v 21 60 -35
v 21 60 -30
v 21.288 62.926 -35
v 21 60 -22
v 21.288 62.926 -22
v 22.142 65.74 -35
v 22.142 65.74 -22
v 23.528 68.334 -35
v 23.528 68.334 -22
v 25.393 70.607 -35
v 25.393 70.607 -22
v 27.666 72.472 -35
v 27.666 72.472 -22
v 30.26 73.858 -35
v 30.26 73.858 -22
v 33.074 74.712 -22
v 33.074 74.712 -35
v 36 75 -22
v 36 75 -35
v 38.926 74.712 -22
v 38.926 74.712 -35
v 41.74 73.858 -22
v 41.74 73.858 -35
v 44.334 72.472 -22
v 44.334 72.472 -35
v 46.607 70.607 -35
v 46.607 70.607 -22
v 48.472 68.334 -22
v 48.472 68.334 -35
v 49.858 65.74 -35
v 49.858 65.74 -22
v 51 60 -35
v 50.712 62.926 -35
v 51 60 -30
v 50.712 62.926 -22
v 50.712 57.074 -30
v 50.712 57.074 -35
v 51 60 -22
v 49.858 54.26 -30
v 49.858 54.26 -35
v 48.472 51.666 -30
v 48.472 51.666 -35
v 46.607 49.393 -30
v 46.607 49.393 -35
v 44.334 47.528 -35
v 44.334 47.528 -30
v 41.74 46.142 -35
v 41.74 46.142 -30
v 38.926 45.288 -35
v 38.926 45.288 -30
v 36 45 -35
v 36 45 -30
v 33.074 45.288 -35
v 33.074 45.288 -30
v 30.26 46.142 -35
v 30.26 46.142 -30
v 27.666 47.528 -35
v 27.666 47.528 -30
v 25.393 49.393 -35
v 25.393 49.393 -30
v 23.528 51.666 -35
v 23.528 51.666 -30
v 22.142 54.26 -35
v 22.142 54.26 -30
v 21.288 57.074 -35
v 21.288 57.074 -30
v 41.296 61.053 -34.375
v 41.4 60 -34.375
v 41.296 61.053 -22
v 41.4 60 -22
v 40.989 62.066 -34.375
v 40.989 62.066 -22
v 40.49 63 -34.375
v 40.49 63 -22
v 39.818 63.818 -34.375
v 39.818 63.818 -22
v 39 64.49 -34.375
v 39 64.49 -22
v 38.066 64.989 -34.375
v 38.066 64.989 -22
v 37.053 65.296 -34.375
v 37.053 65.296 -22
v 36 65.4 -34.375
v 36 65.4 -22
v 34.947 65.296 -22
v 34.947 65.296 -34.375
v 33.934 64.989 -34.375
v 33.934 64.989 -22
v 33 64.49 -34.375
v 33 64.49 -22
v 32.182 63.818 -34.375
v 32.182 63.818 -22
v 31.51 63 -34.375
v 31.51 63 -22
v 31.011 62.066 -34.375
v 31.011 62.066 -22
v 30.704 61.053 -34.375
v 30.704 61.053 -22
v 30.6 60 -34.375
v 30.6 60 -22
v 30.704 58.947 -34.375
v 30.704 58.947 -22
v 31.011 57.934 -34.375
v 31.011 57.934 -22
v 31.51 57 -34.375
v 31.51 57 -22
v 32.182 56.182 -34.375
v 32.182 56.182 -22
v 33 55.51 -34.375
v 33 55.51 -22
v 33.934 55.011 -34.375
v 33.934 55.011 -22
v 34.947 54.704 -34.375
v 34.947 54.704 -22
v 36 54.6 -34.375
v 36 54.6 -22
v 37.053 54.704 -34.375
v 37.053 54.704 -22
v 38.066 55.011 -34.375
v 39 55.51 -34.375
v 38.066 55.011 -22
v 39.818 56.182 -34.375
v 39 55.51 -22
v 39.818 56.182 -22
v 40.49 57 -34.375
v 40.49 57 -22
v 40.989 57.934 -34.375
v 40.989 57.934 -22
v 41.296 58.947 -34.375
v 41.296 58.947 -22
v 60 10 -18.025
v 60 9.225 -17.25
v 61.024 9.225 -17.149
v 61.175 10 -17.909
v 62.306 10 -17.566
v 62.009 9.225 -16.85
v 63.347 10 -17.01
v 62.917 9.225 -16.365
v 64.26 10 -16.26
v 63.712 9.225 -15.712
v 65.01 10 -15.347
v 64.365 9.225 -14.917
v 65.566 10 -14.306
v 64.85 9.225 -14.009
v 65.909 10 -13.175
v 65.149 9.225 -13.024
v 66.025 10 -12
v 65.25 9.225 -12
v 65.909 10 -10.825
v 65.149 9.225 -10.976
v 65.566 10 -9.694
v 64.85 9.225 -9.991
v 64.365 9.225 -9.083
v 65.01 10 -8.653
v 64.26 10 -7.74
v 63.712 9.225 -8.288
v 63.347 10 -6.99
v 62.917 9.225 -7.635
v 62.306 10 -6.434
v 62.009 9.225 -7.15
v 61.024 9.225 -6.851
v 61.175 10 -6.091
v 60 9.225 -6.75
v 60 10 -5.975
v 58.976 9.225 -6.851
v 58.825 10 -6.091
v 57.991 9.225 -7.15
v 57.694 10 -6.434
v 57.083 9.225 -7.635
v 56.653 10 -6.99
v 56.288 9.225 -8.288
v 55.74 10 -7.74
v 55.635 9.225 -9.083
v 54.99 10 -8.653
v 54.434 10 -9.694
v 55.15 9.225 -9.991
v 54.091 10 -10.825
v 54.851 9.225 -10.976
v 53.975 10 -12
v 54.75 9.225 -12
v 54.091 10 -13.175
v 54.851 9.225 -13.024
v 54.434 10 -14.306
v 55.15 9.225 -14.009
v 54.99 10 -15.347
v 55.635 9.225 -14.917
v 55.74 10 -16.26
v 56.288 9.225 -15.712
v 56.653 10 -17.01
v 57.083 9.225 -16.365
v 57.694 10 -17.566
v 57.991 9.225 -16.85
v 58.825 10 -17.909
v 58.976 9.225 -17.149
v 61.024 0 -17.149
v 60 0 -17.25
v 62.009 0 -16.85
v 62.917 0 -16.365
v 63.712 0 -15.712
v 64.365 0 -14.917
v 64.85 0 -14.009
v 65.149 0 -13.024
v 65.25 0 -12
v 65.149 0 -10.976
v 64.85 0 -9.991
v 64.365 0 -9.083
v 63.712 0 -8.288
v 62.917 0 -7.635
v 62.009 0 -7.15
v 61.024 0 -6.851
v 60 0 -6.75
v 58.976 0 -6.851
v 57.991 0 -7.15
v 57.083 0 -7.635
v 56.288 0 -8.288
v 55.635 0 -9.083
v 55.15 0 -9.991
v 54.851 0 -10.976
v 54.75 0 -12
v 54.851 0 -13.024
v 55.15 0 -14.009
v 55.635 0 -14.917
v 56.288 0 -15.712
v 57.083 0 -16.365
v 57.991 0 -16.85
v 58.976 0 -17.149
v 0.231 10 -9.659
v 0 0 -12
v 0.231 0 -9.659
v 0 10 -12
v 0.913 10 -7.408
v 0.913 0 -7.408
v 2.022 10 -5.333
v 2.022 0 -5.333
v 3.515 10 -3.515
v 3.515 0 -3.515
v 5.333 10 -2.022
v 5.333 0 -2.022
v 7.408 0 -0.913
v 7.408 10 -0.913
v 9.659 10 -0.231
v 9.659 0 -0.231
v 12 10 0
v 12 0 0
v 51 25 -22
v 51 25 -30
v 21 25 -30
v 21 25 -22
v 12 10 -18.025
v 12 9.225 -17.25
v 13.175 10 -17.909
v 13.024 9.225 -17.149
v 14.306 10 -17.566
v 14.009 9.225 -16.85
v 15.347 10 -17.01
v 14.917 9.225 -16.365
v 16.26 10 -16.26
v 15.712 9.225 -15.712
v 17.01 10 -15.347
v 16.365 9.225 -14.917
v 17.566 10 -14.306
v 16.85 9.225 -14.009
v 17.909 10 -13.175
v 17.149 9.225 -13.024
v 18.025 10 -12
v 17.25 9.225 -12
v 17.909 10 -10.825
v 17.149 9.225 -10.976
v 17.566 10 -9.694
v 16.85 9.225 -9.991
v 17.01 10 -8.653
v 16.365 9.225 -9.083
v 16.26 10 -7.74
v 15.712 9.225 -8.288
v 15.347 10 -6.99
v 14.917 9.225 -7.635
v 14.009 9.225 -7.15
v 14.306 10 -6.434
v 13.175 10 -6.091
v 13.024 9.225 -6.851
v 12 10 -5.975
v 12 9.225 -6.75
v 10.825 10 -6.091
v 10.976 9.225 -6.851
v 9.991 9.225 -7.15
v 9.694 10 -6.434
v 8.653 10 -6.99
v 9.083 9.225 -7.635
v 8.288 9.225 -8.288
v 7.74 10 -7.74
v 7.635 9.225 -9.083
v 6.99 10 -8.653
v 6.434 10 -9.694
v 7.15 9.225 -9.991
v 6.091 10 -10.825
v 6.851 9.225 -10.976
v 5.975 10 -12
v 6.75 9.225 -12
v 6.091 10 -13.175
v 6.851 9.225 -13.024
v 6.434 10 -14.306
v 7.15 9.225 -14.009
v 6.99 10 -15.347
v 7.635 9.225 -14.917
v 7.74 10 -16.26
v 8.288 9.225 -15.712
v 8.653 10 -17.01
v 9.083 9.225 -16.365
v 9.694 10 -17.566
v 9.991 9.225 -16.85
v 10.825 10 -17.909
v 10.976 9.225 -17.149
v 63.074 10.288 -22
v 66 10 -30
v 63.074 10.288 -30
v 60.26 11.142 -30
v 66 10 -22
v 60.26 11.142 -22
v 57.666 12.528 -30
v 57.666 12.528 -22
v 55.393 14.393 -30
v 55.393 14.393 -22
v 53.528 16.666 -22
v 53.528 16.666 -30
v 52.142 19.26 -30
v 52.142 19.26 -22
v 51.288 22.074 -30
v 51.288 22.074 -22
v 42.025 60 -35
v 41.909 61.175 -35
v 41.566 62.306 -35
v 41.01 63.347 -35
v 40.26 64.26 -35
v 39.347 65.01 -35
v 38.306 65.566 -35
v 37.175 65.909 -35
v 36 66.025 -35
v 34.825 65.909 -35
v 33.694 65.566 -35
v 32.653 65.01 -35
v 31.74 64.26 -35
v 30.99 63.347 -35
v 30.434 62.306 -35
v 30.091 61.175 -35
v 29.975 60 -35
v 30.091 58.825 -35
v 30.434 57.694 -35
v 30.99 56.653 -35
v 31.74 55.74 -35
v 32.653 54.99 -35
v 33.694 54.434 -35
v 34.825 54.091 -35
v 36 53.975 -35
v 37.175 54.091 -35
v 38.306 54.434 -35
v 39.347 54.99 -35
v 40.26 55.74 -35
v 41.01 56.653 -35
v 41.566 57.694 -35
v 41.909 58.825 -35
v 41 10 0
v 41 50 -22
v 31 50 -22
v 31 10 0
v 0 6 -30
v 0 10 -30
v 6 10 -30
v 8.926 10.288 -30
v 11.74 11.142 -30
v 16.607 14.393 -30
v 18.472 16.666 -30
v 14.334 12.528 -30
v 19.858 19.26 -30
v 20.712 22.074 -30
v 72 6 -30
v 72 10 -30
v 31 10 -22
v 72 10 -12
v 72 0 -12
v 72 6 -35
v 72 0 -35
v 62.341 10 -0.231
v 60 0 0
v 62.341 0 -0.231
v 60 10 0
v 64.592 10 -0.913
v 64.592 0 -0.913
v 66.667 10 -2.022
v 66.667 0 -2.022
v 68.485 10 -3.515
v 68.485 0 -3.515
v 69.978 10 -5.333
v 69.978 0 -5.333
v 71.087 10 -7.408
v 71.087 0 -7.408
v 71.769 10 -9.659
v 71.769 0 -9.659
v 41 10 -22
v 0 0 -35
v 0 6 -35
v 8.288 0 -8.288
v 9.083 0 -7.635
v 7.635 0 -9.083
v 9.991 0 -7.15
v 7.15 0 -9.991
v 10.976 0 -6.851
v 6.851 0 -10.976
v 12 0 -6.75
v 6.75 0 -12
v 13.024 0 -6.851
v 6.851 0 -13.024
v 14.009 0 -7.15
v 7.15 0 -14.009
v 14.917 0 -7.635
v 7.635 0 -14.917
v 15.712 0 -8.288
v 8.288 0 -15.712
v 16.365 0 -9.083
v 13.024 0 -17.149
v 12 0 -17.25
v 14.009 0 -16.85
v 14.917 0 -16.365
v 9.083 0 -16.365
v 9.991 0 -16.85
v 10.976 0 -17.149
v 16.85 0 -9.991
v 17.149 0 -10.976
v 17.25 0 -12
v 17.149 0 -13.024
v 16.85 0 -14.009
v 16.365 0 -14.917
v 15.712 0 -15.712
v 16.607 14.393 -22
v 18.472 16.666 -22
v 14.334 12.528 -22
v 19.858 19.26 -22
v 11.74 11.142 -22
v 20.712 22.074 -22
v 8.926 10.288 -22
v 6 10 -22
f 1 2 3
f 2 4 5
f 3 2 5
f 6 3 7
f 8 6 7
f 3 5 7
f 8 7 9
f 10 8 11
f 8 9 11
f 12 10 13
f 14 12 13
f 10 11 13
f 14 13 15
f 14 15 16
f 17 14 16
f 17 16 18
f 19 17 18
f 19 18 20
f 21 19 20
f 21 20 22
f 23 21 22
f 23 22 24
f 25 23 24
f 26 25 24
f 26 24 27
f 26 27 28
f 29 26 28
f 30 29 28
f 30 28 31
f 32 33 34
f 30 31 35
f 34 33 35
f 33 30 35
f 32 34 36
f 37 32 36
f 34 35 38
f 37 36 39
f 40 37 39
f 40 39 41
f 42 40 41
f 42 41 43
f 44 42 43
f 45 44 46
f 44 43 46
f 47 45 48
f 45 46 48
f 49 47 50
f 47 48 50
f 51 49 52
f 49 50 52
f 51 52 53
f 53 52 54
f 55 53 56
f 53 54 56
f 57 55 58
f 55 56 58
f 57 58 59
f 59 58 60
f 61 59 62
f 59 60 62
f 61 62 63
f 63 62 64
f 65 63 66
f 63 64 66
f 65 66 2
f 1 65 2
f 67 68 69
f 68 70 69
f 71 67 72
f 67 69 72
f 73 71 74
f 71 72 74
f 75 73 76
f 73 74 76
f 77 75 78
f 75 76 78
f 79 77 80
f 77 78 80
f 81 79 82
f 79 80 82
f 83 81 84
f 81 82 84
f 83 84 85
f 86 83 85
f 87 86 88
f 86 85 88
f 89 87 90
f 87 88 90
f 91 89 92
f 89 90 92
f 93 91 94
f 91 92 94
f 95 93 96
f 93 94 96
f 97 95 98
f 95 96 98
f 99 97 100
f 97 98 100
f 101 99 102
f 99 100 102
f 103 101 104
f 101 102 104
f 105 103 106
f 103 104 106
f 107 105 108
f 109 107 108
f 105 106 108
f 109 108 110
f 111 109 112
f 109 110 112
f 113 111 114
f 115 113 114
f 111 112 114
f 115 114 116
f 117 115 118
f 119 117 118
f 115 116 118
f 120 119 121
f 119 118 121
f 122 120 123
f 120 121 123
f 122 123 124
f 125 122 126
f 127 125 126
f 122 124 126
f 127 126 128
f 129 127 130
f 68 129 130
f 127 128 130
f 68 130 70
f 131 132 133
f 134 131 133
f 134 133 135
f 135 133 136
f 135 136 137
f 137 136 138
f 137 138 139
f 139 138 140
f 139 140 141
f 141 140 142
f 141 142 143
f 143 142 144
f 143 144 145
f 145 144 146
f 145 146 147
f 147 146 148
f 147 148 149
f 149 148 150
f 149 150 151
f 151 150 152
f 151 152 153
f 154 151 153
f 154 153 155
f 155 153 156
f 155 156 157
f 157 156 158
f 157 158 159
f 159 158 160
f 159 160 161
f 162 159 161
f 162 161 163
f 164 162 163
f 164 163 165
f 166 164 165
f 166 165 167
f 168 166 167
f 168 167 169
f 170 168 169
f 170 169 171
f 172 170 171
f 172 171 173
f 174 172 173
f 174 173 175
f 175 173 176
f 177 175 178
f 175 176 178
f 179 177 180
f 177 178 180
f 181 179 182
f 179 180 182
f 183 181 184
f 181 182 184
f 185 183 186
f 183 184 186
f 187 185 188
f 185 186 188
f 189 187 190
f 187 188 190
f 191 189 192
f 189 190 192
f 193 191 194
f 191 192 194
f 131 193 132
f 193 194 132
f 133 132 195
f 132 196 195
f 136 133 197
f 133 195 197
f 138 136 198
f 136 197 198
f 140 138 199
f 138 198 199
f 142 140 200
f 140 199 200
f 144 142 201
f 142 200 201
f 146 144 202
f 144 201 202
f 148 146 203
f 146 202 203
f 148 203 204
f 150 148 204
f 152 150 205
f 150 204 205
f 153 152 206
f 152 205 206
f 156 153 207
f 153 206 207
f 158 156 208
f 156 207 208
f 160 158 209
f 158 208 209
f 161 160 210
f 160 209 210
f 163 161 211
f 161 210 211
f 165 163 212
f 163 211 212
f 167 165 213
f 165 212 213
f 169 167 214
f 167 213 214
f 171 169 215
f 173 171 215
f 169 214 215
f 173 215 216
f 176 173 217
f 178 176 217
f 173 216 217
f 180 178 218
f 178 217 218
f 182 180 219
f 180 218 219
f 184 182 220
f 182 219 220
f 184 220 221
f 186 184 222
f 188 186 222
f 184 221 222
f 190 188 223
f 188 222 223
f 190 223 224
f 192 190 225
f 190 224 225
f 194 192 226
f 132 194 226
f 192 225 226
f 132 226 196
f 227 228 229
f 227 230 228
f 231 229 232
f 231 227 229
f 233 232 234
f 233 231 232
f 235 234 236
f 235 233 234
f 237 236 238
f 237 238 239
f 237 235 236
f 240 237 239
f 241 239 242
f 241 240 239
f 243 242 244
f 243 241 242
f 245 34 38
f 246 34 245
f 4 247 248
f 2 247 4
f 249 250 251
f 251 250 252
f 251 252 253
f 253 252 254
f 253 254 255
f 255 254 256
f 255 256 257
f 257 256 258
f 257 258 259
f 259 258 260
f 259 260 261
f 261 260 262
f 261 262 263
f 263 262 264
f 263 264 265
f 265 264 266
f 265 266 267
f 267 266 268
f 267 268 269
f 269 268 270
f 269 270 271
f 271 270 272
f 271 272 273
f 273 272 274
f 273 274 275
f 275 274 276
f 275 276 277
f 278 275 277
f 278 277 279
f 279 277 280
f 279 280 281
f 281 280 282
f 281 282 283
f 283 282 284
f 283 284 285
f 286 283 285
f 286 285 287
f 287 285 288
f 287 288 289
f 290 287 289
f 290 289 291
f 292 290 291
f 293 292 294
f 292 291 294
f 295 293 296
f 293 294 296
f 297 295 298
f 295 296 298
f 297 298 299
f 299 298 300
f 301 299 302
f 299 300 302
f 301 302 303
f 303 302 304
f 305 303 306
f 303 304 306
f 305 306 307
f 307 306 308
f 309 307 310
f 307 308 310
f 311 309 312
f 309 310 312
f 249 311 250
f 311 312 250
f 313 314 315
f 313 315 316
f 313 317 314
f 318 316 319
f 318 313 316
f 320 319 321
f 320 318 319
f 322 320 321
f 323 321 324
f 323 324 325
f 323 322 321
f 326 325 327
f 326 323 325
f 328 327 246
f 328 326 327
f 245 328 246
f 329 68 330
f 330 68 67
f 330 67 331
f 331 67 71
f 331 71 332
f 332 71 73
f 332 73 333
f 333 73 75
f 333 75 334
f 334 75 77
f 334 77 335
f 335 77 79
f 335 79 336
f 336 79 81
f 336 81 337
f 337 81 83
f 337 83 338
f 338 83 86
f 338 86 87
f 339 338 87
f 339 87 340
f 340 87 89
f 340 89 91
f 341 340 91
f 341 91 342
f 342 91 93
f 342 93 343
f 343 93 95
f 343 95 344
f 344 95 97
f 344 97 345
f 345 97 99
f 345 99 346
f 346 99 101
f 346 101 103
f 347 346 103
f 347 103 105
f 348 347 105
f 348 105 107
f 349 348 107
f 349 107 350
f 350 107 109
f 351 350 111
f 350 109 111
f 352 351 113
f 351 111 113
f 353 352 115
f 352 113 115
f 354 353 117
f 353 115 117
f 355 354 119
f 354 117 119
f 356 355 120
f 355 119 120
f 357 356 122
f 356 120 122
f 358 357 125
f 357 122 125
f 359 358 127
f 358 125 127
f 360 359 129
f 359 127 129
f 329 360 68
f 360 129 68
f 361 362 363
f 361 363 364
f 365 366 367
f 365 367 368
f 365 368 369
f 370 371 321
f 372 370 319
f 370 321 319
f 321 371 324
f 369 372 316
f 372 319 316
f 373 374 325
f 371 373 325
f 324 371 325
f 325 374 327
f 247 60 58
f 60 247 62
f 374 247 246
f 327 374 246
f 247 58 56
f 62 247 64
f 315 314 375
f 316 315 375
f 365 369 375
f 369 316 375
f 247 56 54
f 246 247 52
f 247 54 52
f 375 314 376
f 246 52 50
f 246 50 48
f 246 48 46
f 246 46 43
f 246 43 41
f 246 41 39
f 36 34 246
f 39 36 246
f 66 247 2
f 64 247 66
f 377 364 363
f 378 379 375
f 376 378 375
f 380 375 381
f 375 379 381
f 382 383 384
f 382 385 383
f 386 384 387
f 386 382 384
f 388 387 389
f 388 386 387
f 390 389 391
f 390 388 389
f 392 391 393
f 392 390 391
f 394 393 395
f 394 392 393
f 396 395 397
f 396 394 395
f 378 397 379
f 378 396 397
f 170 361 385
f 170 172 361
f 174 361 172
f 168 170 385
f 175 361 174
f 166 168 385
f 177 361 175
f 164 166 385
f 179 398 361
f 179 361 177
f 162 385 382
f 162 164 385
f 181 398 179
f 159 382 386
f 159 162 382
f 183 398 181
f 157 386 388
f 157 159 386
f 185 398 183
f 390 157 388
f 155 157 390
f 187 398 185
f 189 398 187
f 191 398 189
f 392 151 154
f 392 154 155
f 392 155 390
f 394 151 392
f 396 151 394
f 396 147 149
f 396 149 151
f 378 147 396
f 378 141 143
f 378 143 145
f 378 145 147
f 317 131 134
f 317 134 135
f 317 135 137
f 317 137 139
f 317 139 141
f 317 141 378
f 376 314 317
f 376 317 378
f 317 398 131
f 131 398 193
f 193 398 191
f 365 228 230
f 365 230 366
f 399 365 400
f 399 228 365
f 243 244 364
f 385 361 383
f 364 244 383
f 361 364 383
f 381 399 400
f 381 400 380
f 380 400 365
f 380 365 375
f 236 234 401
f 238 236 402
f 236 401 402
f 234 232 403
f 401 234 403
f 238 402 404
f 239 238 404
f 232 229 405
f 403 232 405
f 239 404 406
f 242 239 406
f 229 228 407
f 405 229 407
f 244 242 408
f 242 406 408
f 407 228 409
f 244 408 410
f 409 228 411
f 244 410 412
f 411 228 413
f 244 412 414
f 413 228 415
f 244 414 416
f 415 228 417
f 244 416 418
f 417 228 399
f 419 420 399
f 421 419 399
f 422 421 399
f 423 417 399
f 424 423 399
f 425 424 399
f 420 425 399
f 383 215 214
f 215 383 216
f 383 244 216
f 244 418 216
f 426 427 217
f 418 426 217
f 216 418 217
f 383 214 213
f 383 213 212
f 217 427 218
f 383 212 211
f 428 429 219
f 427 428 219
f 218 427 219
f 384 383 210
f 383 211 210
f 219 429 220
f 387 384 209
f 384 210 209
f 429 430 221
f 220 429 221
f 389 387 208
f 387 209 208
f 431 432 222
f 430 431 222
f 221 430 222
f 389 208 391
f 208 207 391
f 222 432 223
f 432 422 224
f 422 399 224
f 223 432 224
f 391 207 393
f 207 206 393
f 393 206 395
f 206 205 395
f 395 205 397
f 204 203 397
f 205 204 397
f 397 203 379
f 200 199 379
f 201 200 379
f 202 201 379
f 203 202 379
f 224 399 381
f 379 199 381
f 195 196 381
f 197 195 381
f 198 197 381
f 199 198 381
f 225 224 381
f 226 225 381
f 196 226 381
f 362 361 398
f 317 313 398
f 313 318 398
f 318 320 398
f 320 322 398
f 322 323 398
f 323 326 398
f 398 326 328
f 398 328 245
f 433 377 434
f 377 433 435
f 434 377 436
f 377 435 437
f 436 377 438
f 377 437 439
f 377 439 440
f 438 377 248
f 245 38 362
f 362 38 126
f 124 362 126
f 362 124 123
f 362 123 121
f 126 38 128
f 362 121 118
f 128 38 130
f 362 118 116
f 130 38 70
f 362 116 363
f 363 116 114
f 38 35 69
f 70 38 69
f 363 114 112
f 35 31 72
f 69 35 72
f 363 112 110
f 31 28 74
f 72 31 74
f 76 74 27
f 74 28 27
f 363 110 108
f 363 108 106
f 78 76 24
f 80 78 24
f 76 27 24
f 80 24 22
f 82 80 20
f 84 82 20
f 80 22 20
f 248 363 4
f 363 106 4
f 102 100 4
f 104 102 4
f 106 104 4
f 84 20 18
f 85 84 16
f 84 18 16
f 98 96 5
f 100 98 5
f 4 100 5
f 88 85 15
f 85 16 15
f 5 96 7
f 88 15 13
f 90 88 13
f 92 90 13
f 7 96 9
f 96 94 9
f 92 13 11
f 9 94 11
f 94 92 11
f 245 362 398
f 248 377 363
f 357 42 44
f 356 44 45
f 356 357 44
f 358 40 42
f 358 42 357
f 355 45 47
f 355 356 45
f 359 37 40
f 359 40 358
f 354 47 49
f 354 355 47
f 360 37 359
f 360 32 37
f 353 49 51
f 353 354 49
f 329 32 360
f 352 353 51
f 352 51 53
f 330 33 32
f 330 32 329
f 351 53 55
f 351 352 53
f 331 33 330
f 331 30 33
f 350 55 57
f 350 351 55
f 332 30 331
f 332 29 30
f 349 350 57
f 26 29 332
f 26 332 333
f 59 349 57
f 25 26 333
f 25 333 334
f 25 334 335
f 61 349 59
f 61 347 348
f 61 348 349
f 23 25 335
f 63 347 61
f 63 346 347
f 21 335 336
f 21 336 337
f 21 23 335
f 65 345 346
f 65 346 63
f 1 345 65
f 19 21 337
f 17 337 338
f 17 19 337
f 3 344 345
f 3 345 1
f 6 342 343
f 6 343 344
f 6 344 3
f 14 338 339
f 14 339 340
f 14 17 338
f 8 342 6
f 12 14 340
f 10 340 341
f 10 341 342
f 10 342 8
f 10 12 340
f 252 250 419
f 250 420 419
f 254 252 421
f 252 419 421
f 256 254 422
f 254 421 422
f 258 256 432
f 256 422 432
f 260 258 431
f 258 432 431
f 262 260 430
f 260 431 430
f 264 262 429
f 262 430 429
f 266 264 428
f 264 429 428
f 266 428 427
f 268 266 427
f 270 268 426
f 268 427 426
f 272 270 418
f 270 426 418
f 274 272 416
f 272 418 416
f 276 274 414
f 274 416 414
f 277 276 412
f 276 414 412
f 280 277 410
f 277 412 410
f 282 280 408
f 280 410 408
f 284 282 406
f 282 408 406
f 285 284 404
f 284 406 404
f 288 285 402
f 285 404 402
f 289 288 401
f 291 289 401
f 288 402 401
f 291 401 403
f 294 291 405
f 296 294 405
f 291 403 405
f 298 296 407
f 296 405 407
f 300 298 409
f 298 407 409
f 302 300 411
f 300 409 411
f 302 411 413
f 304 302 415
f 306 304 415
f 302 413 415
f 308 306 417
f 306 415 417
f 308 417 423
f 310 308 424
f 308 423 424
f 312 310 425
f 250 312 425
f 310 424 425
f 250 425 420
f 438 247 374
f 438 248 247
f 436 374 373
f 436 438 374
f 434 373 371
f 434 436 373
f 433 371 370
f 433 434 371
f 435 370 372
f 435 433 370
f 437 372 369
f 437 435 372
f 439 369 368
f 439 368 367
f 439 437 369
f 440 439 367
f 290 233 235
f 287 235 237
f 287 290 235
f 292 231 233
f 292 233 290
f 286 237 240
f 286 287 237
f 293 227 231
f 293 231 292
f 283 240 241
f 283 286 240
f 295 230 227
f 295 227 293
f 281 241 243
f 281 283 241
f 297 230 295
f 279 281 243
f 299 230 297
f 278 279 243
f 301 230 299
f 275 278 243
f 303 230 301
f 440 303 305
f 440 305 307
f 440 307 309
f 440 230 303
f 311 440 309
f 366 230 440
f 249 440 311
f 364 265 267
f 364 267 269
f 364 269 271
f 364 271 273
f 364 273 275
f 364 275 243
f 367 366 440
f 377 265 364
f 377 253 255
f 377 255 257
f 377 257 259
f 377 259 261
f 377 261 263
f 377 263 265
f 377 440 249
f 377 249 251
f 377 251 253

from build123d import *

# Parameters (mm, degrees)
SKETCH1_W                         = 72
SKETCH1_H                         = 35
BOSS_EXTRUDE1_DEPTH               = 10
SKETCH3_W                         = 72
SKETCH3_H                         = 5
CUT_EXTRUDE1_DEPTH                = 4
BOSS_EXTRUDE2_DEPTH               = 8
SKETCH5_R                         = 15
BOSS_EXTRUDE3_DEPTH               = 5
M12X1_25_TAPPED_HOLE1_D           = 10.8
M12X1_25_TAPPED_HOLE1_CSINK_D     = 12.05
M12X1_25_TAPPED_HOLE1_CSINK_ANGLE = 90
FILLET1_R                         = 15
SKETCH9_W                         = 10
SKETCH9_H                         = 22
BOSS_EXTRUDE4_DEPTH               = 40
CUT_EXTRUDE2_DEPTH                = 40
FILLET2_R                         = 12
M12X1_5_TAPPED_HOLE1_D            = 10.5
M12X1_5_TAPPED_HOLE1_CSINK_D      = 12.05
M12X1_5_TAPPED_HOLE1_CSINK_ANGLE  = 90


with BuildPart() as part:
    # Sketch1 → Boss-Extrude1 (new body)
    with BuildSketch(Plane(origin=(0, 0, 0), x_dir=(1, 0, 0), z_dir=(0, 1, 0))):
        with Locations((36, 17.5)):
            Rectangle(SKETCH1_W, SKETCH1_H)
    extrude(amount=BOSS_EXTRUDE1_DEPTH)

    # Sketch3 → Cut-Extrude1 (cut)
    with BuildSketch(Plane(origin=(0, 10, 0), x_dir=(1, 0, 0), z_dir=(0, 1, 0))):
        with Locations((36, 32.5)):
            Rectangle(SKETCH3_W, SKETCH3_H)
    extrude(amount=-CUT_EXTRUDE1_DEPTH, mode=Mode.SUBTRACT)

    # Sketch4 → Boss-Extrude2 (add)
    with BuildSketch(Plane(origin=(0, 0, -30), x_dir=(-1, 0, 0), z_dir=(0, 0, -1))):
        with BuildLine():
            Line((-51, 10), (-21, 10))
            Line((-21, 10), (-21, 60))
            ThreePointArc((-21, 60), (-36, 75), (-51, 60))
            Line((-51, 60), (-51, 10))
        make_face()
    extrude(amount=-BOSS_EXTRUDE2_DEPTH)

    # Sketch5 → Boss-Extrude3 (add)
    with BuildSketch(Plane(origin=(0, 0, -30), x_dir=(-1, 0, 0), z_dir=(0, 0, -1))):
        with Locations((-36, 60)):
            Circle(SKETCH5_R)
    extrude(amount=BOSS_EXTRUDE3_DEPTH)

    # M12x1.25 Tapped Hole1 (through all)
    with Locations(Plane(origin=(36, 60, -35), x_dir=(-1, 0, 0), z_dir=(0, 0, -1))):
        with Locations((0, 0)):
            CounterSinkHole(M12X1_25_TAPPED_HOLE1_D / 2, M12X1_25_TAPPED_HOLE1_CSINK_D / 2, counter_sink_angle=M12X1_25_TAPPED_HOLE1_CSINK_ANGLE)

    # Fillet1
    fillet1_edges = [part.edges().sort_by_distance(p)[0] for p in [
        (21, 10, -26),
        (51, 10, -26),
    ]]
    fillet(fillet1_edges, radius=FILLET1_R)

    # Sketch9 → Boss-Extrude4 (add)
    with BuildSketch(Plane(origin=(0, 10, 0), x_dir=(1, 0, 0), z_dir=(0, 1, 0))):
        with Locations((36, 11)):
            Rectangle(SKETCH9_W, SKETCH9_H)
    extrude(amount=BOSS_EXTRUDE4_DEPTH)

    # Sketch10 → Cut-Extrude2 (cut)
    with BuildSketch(Plane(origin=(41, 0, 0), x_dir=(0, 0, -1), z_dir=(1, 0, 0))):
        Polygon((22, 50), (0, 10), (0, 50), align=None)
    extrude(amount=-CUT_EXTRUDE2_DEPTH, mode=Mode.SUBTRACT)

    # Fillet2
    fillet2_edges = [part.edges().sort_by_distance(p)[0] for p in [
        (0, 5, 0),
        (72, 5, 0),
    ]]
    fillet(fillet2_edges, radius=FILLET2_R)

    # M12x1.5 Tapped Hole1 (through all)
    with Locations(Plane(origin=(12, 10, -12), x_dir=(0, 0, 1), z_dir=(0, 1, 0))):
        with Locations((0, 0), (0, 48)):
            CounterSinkHole(M12X1_5_TAPPED_HOLE1_D / 2, M12X1_5_TAPPED_HOLE1_CSINK_D / 2, counter_sink_angle=M12X1_5_TAPPED_HOLE1_CSINK_ANGLE)


solid = part.part
